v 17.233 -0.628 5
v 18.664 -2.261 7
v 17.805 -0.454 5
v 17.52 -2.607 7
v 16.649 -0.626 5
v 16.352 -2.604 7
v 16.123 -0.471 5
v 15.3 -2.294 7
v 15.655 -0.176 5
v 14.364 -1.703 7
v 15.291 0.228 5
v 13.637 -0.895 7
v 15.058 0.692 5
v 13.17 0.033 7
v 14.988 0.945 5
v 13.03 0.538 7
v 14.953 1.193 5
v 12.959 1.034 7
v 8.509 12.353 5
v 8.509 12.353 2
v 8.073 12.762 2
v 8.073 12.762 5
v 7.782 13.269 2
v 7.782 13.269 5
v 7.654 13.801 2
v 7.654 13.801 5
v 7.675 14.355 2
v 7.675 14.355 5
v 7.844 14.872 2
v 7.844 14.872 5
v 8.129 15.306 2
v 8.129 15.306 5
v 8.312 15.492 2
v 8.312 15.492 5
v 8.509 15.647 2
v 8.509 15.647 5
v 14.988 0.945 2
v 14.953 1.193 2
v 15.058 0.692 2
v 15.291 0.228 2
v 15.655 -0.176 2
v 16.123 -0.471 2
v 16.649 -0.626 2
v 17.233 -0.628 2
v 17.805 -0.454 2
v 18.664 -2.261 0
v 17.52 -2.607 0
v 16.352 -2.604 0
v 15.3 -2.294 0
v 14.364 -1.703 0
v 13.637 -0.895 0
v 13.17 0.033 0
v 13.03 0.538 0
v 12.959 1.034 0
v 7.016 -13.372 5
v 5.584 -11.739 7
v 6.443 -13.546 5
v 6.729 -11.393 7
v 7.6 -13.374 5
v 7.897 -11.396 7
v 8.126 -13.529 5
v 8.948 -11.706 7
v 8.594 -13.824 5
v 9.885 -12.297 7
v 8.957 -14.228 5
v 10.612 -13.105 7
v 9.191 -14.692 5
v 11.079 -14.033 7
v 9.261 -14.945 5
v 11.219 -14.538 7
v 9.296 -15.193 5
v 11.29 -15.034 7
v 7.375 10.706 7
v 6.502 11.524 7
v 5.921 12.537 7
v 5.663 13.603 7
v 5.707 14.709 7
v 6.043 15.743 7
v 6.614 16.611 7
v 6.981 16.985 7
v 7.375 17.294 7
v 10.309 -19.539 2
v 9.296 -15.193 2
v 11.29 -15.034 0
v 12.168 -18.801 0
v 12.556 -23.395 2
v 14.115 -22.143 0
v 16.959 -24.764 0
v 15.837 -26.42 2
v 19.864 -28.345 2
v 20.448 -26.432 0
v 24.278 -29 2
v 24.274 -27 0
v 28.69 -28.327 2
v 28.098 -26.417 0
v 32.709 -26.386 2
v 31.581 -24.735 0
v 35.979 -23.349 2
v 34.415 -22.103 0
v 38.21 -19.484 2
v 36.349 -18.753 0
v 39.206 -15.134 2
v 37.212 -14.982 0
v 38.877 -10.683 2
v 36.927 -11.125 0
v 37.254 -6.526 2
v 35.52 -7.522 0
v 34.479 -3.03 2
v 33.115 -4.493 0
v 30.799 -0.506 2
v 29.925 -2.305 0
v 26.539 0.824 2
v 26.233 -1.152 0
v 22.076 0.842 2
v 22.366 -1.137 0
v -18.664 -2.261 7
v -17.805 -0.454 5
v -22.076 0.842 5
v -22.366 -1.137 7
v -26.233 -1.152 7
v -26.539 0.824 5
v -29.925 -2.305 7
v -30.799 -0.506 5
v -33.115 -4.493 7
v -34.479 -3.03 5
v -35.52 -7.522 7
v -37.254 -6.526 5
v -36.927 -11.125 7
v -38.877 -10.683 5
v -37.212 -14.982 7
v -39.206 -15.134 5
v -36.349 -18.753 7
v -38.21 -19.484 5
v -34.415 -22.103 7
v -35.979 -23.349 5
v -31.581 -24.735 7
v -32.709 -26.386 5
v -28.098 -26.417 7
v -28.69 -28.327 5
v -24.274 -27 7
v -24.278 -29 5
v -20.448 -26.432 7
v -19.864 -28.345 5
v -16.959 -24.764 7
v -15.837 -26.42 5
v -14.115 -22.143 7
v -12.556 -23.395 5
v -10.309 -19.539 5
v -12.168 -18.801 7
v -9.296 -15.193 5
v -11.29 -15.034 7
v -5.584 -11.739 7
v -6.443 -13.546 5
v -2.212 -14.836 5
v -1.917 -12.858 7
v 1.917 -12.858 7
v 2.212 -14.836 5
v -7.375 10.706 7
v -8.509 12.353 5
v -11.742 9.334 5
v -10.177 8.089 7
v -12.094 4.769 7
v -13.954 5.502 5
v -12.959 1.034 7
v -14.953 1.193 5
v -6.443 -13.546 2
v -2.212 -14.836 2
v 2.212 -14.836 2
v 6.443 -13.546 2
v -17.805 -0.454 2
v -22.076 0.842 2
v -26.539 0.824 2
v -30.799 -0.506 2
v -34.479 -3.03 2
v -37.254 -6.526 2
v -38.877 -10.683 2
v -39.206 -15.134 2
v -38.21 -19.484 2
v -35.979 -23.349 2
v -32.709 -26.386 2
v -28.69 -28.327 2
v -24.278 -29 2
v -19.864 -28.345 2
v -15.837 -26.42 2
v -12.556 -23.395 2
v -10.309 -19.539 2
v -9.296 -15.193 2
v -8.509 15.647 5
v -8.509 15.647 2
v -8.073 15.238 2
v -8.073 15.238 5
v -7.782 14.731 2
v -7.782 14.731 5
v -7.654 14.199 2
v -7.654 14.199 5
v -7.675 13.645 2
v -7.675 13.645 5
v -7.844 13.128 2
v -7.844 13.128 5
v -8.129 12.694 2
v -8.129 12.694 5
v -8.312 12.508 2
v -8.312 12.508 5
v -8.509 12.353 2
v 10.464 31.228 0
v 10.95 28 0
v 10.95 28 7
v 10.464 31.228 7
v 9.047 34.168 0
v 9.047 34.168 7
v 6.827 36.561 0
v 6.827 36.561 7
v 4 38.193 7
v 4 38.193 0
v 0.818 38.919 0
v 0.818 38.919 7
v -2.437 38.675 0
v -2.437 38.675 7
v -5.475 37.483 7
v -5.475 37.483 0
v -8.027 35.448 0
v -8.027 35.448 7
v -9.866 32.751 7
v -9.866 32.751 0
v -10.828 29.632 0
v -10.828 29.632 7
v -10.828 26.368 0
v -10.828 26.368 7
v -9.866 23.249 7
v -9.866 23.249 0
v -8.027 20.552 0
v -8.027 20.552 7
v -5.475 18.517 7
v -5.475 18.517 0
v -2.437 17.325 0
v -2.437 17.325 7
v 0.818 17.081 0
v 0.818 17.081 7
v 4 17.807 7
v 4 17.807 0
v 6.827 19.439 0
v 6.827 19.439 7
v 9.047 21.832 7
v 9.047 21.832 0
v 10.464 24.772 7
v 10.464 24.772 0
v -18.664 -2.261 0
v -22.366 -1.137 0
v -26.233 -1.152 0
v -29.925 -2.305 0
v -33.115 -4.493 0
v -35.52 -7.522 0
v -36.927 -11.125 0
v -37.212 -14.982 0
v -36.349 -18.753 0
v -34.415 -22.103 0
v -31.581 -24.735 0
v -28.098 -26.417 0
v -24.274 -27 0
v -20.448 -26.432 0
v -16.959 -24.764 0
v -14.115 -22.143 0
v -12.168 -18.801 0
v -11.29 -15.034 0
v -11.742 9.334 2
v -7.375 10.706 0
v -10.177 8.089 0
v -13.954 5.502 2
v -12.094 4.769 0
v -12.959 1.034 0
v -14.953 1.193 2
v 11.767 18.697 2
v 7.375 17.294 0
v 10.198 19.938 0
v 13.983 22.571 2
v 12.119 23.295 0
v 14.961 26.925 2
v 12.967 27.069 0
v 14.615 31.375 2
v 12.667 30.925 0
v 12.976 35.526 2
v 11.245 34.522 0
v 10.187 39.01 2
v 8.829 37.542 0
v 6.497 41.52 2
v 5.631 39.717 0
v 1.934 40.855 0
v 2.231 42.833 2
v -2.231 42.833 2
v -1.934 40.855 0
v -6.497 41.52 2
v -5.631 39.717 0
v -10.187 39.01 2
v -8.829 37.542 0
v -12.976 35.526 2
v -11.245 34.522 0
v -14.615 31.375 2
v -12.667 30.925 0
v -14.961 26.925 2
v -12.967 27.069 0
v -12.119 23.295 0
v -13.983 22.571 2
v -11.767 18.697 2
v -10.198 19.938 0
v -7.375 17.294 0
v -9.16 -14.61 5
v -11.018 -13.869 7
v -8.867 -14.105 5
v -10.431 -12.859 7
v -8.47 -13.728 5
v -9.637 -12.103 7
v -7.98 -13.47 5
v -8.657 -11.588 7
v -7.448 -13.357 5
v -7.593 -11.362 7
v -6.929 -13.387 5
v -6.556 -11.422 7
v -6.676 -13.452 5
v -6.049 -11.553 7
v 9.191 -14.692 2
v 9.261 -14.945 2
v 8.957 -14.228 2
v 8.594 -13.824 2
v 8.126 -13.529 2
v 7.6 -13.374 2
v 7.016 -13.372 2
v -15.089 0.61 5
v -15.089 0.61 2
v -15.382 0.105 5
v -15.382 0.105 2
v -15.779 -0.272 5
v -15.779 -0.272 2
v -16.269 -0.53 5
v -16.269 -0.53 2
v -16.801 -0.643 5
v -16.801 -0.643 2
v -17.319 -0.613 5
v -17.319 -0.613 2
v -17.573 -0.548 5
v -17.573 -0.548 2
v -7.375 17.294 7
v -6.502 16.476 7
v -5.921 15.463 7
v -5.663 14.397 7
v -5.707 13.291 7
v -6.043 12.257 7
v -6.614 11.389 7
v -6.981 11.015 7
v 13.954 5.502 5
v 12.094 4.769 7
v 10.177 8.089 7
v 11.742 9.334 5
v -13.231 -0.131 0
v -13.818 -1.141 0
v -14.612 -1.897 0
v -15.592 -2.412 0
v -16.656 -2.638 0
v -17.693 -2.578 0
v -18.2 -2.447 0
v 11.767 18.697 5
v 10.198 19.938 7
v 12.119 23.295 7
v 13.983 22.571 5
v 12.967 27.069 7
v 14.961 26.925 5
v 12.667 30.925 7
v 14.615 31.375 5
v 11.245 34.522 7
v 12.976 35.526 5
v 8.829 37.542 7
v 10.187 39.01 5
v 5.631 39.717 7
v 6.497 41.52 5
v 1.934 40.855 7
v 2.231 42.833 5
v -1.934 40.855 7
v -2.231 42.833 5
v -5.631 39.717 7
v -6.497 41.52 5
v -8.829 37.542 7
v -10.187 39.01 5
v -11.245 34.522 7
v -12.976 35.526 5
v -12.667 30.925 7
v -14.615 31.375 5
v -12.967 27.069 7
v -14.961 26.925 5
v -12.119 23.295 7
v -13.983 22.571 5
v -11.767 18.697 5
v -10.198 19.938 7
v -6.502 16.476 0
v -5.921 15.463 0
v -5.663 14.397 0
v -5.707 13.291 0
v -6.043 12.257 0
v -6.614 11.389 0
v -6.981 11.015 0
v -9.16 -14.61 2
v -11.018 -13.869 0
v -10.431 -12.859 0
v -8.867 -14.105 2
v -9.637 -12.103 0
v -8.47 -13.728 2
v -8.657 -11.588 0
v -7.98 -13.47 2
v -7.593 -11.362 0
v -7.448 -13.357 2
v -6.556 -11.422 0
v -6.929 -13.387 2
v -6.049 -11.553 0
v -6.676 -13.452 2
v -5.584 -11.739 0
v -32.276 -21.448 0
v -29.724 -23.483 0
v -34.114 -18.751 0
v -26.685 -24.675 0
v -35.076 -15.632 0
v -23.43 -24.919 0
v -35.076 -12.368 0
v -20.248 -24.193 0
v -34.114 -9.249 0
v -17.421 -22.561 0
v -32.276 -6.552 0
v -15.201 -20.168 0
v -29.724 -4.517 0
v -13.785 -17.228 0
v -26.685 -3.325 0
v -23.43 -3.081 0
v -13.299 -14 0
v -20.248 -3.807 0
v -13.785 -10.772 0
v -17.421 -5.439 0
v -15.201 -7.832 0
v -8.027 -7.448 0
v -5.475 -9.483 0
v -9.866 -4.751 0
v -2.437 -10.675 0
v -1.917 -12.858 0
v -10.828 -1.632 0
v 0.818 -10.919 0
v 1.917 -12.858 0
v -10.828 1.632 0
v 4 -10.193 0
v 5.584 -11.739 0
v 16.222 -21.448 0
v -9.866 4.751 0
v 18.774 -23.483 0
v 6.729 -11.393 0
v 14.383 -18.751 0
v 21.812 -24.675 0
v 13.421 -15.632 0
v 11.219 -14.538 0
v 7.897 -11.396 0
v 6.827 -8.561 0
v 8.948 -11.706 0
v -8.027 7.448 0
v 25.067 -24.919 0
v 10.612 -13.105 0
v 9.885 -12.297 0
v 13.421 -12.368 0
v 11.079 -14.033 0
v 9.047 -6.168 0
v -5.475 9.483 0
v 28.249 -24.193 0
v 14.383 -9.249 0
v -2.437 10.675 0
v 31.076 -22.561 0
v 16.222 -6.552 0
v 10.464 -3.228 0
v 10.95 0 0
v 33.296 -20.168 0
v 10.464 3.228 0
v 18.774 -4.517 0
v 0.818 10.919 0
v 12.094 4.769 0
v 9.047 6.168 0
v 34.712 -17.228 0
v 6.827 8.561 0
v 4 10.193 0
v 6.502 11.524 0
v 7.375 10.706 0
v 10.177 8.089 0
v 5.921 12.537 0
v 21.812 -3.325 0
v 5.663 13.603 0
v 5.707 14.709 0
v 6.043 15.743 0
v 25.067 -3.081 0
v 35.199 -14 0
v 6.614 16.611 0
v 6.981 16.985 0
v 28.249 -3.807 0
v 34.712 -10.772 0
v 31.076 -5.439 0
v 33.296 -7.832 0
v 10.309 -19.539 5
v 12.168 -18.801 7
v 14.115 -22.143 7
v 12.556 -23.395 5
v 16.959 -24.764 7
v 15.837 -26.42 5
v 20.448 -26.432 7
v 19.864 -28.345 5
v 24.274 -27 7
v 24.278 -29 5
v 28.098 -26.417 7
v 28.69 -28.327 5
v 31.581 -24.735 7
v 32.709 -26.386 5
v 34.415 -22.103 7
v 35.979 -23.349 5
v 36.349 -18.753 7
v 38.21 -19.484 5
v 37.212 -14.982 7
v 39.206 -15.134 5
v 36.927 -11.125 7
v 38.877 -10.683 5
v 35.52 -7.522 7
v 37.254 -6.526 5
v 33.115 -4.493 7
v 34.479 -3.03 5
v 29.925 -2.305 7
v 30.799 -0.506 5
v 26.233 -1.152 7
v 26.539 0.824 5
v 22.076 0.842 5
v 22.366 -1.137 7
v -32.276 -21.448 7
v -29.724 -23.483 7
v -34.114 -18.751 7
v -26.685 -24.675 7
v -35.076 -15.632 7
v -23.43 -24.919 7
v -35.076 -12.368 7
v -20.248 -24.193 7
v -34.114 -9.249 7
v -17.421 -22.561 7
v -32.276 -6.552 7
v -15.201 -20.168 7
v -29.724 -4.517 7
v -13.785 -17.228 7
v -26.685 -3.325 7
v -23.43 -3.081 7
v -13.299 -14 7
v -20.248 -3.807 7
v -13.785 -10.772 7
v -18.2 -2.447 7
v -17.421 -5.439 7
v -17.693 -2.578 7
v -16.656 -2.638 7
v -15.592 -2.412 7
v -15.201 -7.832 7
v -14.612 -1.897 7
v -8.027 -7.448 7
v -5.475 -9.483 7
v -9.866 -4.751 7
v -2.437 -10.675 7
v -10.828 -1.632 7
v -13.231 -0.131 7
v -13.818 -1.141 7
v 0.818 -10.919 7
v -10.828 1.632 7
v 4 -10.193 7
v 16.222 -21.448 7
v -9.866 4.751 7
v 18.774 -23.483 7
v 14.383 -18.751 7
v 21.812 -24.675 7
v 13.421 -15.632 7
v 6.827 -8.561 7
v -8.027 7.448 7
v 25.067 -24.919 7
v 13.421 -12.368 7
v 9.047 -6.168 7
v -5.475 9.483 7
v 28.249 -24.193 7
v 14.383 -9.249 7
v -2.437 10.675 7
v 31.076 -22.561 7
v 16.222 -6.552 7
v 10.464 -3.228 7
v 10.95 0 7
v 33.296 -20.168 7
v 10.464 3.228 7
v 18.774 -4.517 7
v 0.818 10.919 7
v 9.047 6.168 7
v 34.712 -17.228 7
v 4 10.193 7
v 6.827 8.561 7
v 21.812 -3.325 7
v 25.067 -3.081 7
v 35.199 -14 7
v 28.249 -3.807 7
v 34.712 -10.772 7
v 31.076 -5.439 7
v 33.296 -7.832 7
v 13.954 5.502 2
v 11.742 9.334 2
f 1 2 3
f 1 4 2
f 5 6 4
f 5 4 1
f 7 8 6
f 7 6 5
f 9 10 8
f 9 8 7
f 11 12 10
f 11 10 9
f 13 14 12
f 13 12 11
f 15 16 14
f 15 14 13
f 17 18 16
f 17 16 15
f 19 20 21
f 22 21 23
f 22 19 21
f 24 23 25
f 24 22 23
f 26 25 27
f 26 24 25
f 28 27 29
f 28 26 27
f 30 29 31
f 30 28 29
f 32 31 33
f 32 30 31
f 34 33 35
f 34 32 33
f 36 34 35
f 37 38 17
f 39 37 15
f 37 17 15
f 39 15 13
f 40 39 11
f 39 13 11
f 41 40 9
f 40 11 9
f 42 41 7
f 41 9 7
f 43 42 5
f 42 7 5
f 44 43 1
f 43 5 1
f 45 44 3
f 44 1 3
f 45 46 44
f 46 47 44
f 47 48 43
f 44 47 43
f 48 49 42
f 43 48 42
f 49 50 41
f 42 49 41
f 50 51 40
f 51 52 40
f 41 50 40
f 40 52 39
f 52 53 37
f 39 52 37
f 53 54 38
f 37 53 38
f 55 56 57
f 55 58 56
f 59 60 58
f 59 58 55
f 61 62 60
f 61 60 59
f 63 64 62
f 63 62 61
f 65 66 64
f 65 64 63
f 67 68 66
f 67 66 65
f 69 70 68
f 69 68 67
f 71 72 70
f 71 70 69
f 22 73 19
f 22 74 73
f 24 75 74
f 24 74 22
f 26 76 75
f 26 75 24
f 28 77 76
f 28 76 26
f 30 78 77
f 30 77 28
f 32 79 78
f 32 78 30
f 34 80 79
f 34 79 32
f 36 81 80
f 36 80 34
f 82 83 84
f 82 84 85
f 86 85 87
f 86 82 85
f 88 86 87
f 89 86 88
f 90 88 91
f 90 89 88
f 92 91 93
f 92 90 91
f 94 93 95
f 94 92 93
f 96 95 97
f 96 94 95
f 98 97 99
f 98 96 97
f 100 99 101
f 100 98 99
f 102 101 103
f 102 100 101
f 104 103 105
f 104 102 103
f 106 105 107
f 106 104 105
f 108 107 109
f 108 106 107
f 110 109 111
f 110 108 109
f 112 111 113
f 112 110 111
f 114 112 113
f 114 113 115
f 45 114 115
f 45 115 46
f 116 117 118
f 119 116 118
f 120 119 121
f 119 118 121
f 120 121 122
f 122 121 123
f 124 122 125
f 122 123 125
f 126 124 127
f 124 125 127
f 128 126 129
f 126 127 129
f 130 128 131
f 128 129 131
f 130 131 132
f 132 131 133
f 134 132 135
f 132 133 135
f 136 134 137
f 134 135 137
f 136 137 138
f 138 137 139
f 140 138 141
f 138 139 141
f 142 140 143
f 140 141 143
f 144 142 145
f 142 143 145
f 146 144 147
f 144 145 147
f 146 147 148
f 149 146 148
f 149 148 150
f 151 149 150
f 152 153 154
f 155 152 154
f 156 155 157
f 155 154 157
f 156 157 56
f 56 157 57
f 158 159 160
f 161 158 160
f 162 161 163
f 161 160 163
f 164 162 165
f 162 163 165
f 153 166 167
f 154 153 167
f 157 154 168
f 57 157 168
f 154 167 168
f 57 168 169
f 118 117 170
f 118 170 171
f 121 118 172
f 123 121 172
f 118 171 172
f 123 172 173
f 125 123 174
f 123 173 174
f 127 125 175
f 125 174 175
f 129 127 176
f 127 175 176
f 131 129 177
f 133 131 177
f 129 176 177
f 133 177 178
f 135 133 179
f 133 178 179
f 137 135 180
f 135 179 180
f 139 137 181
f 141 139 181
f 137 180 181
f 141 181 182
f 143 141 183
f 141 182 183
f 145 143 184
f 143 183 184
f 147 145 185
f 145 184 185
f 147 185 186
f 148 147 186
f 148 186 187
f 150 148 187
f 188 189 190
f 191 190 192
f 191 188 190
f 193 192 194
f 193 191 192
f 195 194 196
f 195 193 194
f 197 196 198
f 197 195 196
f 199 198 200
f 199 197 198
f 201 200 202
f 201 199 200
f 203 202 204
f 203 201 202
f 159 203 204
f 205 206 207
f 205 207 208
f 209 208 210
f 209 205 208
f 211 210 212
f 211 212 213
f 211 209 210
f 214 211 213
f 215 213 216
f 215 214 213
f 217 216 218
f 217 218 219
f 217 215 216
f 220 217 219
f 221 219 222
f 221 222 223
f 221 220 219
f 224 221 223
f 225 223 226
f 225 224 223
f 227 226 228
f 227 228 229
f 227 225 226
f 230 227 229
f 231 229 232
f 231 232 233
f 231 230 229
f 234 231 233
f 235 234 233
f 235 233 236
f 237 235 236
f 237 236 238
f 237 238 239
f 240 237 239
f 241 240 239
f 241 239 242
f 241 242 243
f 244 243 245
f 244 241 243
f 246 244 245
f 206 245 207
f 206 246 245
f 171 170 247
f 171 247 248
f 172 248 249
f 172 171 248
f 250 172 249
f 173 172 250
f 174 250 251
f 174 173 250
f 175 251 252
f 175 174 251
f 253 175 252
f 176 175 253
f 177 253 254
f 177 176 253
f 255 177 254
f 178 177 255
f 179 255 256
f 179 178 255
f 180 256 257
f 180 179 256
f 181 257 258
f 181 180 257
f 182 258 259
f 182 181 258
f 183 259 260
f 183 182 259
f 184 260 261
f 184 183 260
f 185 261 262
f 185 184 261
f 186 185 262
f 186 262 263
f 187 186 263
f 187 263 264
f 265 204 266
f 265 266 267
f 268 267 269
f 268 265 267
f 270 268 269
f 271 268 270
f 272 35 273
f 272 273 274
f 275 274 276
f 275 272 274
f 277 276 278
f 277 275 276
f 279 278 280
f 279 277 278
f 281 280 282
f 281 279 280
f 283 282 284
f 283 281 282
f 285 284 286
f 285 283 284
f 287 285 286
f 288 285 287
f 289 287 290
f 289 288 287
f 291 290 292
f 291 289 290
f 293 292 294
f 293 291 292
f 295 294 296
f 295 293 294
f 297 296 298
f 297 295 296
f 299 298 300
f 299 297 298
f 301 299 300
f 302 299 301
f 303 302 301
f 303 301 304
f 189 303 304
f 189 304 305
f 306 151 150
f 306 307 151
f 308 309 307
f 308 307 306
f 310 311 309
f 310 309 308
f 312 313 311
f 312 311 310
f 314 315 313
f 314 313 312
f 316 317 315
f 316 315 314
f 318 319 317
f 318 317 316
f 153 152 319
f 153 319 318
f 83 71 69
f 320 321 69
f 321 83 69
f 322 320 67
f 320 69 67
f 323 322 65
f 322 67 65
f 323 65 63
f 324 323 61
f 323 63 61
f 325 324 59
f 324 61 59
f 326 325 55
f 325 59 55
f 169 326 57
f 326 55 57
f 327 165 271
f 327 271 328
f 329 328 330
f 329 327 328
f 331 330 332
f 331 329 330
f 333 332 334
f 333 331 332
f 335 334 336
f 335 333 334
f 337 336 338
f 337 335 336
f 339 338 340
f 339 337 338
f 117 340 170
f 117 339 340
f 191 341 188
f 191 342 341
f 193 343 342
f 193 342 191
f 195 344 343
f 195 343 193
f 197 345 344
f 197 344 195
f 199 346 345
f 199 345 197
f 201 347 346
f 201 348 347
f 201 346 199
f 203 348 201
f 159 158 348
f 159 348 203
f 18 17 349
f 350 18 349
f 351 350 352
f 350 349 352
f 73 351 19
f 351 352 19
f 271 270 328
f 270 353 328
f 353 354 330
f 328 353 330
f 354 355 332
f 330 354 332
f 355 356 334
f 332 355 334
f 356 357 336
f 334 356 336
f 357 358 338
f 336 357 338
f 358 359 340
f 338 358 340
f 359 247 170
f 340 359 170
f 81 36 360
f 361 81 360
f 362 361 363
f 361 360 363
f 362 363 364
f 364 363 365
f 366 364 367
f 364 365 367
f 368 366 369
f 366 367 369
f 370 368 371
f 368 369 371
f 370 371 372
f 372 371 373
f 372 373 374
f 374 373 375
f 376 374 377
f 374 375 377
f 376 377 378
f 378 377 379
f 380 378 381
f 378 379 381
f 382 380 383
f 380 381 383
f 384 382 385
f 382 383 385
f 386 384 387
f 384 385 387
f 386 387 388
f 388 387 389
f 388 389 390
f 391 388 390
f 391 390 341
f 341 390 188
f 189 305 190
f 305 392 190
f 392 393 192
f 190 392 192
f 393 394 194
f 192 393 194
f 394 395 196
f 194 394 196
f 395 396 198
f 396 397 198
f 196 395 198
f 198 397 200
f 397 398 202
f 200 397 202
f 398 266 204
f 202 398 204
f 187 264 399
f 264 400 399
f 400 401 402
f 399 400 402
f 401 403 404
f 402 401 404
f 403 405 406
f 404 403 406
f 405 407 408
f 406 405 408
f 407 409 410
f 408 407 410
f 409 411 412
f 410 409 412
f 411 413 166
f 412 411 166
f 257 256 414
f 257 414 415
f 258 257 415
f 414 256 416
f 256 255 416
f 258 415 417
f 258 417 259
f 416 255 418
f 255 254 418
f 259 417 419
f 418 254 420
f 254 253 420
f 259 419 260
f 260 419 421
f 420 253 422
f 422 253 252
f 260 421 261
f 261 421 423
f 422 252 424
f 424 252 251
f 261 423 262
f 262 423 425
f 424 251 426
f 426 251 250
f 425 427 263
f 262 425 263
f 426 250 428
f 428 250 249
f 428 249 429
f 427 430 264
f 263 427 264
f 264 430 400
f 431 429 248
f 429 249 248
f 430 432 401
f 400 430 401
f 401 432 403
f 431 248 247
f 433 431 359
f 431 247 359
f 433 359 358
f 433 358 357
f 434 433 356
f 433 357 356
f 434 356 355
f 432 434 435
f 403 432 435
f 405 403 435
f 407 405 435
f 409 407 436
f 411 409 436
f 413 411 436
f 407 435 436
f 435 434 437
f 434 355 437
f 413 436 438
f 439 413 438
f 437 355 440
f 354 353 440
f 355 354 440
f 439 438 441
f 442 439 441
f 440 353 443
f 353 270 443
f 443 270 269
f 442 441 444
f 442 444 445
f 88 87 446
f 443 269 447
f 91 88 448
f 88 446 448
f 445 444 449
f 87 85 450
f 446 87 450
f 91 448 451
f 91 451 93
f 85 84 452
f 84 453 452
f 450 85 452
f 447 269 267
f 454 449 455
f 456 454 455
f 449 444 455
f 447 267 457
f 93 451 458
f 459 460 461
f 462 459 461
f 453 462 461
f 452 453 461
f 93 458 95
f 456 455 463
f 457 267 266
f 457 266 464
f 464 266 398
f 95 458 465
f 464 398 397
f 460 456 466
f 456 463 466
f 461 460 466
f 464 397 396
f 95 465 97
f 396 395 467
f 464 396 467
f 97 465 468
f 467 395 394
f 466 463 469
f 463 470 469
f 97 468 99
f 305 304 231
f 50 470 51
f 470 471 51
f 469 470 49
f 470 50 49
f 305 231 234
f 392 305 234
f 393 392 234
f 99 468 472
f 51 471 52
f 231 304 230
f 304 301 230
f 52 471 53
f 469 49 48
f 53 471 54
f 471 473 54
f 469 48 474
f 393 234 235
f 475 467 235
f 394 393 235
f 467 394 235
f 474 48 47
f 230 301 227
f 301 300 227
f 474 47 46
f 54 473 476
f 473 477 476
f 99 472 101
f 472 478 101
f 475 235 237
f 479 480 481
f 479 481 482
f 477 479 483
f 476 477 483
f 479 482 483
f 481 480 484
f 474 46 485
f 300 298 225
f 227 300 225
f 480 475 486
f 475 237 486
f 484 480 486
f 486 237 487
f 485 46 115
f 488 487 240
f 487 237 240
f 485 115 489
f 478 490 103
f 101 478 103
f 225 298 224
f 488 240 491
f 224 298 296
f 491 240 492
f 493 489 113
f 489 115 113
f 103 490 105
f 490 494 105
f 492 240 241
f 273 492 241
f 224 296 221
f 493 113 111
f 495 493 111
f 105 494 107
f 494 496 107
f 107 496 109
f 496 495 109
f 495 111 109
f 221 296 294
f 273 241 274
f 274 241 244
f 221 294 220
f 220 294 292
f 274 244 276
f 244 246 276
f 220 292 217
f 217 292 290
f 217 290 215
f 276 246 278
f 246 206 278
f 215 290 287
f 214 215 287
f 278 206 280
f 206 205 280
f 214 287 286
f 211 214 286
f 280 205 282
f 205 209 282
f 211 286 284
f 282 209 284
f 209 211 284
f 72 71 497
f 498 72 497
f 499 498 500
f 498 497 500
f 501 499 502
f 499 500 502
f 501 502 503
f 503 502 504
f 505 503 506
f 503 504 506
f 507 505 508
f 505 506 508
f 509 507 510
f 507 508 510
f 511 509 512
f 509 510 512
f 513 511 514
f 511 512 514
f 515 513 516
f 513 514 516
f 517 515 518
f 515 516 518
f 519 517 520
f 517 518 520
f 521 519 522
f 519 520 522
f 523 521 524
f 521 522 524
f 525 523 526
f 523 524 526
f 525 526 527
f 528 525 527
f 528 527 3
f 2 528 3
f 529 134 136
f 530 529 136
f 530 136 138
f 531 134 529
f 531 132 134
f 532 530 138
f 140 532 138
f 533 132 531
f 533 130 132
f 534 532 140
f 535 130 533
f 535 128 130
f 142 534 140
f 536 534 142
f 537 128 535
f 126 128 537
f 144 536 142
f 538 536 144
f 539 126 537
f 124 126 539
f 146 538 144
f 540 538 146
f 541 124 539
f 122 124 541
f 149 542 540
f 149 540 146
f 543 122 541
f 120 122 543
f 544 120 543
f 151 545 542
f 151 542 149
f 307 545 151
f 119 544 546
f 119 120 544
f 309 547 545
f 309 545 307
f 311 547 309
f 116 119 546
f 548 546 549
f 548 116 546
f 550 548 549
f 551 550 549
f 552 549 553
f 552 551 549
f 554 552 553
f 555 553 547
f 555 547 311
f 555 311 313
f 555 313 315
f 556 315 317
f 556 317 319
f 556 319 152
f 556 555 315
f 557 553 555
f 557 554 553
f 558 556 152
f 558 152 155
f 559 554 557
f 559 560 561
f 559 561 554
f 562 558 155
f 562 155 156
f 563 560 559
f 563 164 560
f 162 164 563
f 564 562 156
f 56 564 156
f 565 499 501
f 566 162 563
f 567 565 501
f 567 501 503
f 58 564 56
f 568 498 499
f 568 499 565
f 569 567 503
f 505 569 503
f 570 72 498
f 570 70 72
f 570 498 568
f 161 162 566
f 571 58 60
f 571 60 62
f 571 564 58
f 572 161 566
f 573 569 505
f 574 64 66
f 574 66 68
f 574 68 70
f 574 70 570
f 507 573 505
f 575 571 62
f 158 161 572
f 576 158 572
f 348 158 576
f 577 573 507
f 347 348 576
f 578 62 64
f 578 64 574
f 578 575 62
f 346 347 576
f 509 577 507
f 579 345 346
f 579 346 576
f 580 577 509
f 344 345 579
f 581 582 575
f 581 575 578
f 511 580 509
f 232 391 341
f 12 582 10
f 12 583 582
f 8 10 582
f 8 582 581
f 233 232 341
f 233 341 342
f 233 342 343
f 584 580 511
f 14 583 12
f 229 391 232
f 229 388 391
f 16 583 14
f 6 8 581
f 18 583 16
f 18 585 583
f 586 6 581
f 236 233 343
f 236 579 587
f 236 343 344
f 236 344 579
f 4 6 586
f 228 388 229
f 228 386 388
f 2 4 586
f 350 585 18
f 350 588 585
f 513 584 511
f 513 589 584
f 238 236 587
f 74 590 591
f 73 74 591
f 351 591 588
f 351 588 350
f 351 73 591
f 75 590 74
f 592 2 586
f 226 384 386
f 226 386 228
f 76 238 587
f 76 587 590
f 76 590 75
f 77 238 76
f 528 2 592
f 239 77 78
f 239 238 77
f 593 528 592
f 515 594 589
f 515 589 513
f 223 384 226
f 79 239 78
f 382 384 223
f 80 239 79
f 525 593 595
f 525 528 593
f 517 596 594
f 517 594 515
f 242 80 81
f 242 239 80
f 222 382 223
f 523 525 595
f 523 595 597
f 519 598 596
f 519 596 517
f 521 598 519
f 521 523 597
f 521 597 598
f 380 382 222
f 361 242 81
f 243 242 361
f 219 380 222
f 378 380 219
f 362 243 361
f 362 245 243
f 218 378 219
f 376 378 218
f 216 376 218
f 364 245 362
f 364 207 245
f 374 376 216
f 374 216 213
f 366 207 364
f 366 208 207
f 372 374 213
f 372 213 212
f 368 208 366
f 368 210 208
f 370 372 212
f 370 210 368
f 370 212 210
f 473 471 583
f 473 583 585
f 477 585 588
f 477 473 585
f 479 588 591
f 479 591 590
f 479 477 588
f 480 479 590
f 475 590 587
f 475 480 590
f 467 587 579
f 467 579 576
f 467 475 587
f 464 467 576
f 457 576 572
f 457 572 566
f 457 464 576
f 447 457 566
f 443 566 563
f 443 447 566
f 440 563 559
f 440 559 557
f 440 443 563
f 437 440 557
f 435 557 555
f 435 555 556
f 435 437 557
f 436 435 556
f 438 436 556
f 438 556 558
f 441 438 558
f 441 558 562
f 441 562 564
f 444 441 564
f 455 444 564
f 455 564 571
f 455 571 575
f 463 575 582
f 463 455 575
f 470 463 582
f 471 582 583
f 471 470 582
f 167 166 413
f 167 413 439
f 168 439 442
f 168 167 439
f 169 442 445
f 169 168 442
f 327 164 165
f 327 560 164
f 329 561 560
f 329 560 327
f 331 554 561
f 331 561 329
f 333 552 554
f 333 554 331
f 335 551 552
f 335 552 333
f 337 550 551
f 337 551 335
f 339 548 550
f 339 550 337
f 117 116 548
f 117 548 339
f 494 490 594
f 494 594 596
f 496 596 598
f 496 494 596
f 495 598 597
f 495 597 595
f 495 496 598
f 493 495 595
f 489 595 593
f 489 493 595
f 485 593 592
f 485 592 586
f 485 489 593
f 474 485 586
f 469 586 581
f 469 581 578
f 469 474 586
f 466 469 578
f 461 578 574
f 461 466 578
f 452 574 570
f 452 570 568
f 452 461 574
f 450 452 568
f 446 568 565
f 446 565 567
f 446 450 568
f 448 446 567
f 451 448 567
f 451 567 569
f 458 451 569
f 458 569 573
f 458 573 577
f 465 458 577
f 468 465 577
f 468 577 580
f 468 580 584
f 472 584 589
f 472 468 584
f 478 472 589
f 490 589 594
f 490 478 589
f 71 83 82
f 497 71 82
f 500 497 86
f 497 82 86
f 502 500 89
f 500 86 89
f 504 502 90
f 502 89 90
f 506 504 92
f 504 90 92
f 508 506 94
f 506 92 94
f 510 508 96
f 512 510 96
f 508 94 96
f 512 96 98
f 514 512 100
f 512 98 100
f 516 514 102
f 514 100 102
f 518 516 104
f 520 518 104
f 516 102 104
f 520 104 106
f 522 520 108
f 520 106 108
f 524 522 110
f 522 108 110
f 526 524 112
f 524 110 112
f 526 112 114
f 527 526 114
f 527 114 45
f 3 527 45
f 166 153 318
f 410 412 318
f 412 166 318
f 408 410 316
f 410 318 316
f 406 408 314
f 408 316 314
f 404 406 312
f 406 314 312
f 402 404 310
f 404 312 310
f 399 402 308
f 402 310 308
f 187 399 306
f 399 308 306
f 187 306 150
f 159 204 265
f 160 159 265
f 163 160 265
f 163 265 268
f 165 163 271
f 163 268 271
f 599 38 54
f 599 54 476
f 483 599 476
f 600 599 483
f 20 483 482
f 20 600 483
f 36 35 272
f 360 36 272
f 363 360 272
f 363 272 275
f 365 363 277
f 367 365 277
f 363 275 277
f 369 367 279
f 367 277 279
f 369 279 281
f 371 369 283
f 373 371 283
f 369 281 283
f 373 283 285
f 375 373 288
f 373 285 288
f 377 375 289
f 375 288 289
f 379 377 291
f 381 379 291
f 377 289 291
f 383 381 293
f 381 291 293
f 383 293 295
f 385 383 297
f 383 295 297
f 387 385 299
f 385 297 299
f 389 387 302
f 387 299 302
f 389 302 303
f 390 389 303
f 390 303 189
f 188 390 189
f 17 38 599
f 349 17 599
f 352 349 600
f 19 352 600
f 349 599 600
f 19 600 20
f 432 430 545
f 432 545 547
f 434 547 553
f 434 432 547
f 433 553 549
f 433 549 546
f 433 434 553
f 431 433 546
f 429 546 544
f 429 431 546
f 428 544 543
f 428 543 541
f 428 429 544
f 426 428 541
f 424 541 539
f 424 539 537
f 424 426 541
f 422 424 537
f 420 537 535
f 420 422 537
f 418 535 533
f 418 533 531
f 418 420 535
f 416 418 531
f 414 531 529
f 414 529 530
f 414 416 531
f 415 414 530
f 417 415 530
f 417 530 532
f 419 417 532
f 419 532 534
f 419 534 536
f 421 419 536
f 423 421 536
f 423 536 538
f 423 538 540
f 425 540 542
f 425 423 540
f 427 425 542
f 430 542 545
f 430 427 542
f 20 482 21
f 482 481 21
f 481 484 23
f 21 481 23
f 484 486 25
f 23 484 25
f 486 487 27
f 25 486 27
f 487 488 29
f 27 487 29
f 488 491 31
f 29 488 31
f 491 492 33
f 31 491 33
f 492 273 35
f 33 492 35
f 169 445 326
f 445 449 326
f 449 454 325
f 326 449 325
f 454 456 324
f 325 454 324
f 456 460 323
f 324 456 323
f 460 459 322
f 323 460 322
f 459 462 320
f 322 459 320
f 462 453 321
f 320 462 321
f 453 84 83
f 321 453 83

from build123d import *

# Parameters (mm, degrees)
F0_R     = 10.95
F1_DEPTH = 7
F2_R     = 2
F3_SIZE  = 2


with BuildPart() as f1:
    # F0 (on Top) → F1 (new body)
    with BuildSketch(Plane.XY):
        with BuildLine():
            ThreePointArc((14.816938, -2.33631), (12.990381, 7.5), (5.385165, 14))
            ThreePointArc((5.385165, 14), (0, 43), (-5.385165, 14))
            ThreePointArc((-5.385165, 14), (-12.990381, 7.5), (-14.816938, -2.33631))
            ThreePointArc((-14.816938, -2.33631), (-37.239092, -21.5), (-9.431773, -11.66369))
            ThreePointArc((-9.431773, -11.66369), (0, -15), (9.431773, -11.66369))
            ThreePointArc((9.431773, -11.66369), (37.239092, -21.5), (14.816938, -2.33631))
        make_face()
        with Locations((-24.248711, -14)):
            Circle(F0_R, mode=Mode.SUBTRACT)
        with Locations((24.248711, -14)):
            Circle(F0_R, mode=Mode.SUBTRACT)
        Circle(F0_R, mode=Mode.SUBTRACT)
        with Locations((0, 28)):
            Circle(F0_R, mode=Mode.SUBTRACT)
    extrude(amount=F1_DEPTH)

    # F2
    f2_edges = [f1.edges().sort_by_distance(p)[0] for p in [
        (-9.431773, -11.66369, 3.5),
        (9.431773, -11.66369, 3.5),
        (14.816938, -2.33631, 3.5),
        (5.385165, 14, 3.5),
        (-5.385165, 14, 3.5),
        (-14.816938, -2.33631, 3.5),
    ]]
    fillet(f2_edges, radius=F2_R)

    # F3
    f3_edges = [f1.edges().sort_by_distance(p)[0] for p in [
        (37.239092, -21.5, 0),
        (37.239092, -21.5, 7),
    ]]
    chamfer(f3_edges, length=F3_SIZE)


solid = f1.part
